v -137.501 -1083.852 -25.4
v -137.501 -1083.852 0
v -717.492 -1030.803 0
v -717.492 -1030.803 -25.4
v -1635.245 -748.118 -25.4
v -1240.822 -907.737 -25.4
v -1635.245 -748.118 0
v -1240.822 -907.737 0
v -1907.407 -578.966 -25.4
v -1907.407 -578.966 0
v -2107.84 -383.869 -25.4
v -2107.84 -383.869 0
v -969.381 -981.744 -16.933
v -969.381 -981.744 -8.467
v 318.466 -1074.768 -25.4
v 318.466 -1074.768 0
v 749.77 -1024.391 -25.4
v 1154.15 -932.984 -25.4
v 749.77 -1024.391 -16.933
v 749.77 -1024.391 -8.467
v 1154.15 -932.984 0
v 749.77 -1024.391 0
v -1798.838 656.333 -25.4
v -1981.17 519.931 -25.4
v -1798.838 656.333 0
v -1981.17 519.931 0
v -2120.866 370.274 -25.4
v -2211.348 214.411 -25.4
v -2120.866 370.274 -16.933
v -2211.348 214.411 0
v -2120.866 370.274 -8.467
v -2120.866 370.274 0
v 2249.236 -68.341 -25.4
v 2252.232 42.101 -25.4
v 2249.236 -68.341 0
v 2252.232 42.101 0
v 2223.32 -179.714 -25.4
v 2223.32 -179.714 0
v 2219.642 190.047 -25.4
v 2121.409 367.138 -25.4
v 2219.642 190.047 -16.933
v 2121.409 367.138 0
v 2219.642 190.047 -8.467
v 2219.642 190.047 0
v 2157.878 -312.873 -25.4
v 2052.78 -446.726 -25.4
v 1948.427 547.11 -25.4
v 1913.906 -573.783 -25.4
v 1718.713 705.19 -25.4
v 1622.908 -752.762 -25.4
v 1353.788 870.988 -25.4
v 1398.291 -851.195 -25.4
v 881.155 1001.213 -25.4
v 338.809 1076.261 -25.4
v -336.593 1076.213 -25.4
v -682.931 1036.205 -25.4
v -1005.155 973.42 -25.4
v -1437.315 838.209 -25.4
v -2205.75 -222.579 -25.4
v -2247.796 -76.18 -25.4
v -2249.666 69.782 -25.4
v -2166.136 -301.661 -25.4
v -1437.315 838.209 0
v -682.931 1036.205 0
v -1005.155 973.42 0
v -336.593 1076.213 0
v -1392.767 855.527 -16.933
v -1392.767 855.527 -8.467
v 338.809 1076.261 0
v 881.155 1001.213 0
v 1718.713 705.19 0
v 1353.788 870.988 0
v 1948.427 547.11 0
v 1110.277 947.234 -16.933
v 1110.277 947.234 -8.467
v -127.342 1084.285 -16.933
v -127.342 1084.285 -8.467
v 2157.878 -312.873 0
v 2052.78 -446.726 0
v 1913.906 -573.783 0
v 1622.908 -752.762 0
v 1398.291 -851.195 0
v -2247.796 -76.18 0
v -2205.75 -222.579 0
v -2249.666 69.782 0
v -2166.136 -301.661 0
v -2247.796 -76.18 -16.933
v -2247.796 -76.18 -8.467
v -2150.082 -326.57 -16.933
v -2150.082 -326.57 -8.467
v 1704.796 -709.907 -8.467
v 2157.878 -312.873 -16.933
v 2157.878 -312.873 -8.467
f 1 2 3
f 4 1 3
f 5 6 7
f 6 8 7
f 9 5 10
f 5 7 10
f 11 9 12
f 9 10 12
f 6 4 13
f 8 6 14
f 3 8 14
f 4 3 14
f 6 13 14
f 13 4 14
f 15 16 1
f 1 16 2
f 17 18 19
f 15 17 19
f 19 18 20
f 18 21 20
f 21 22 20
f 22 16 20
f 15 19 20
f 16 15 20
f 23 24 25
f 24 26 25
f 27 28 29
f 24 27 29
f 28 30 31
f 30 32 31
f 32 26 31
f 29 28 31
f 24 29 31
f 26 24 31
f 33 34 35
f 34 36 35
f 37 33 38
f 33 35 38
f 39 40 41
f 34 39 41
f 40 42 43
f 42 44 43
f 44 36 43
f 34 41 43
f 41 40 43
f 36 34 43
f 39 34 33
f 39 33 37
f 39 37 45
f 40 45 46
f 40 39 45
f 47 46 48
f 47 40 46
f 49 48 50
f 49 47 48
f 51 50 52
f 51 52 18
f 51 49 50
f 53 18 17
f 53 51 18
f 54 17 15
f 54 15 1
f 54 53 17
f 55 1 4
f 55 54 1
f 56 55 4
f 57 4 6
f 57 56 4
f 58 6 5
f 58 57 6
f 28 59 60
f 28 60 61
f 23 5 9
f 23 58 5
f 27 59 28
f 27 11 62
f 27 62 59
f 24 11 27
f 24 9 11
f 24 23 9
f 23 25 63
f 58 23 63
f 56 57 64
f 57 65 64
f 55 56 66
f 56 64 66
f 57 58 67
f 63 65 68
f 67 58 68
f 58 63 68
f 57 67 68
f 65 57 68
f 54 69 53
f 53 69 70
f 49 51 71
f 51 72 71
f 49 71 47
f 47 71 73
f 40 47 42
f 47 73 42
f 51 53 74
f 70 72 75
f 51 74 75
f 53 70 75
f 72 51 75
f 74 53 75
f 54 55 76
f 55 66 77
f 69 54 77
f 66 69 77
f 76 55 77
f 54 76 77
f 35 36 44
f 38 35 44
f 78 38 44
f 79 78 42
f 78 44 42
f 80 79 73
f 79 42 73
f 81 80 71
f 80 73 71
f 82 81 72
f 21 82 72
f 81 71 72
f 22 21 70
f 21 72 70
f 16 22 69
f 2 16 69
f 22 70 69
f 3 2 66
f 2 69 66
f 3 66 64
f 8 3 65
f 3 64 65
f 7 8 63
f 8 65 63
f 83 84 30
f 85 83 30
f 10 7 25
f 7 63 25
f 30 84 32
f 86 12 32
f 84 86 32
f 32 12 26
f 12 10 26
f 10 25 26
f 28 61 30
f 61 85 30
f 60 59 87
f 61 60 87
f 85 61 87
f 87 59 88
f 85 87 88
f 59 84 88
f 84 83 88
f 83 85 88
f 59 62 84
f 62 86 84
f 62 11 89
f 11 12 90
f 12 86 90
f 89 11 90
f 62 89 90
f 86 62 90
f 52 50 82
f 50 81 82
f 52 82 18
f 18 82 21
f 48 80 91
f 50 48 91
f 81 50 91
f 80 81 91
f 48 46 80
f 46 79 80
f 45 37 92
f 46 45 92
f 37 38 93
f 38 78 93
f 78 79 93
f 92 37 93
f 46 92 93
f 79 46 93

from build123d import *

# Parameters (mm, degrees)
F2_DEPTH = 25.4


with BuildPart() as f2:
    # F1 (on Top) → F2 (new body)
    with BuildSketch(Plane.XY):
        with BuildLine():
            add(Edge.make_bspline(
                [(338.808568, 1076.2607888), (1177.613977, 1009.3793122), (1835.703466, 747.5897164), (2121.40927, 367.1379246)],
                knots=[0, 0, 0, 0, 1, 1, 1, 1], degree=3))
            add(Edge.make_bspline(
                [(-336.59318, 1076.2131638), (-184.038113, 1088.3100662), (187.362211, 1088.3362028), (338.808568, 1076.2607888)],
                knots=[0, 0, 0, 0, 1, 1, 1, 1], degree=3))
            add(Edge.make_bspline(
                [(-1798.8381092, 656.3331552), (-1440.1367184, 883.221119), (-932.630342, 1028.9502916), (-336.59318, 1076.2131638)],
                knots=[0, 0, 0, 0, 1, 1, 1, 1], degree=3))
            add(Edge.make_bspline(
                [(-2211.3484602, 214.4111282), (-2147.6651738, 371.0291792), (-2000.2956692, 528.9060796), (-1798.8381092, 656.3331552)],
                knots=[0, 0, 0, 0, 1, 1, 1, 1], degree=3))
            add(Edge.make_bspline(
                [(-2205.74997, -222.5787014), (-2267.88091, -76.2598424), (-2269.7642692, 70.7474074), (-2211.3484602, 214.4111282)],
                knots=[0, 0, 0, 0, 1, 1, 1, 1], degree=3))
            add(Edge.make_bspline(
                [(-2107.8400058, -383.8687014), (-2158.7942346, -318.362584), (-2179.703921, -283.9173392), (-2205.74997, -222.5787014)],
                knots=[0, 0, 0, 0, 1, 1, 1, 1], degree=3))
            add(Edge.make_bspline(
                [(-137.500868, -1083.8523154), (-1015.799975, -1061.966126), (-1795.9728114, -784.8016054), (-2107.8400058, -383.8687014)],
                knots=[0, 0, 0, 0, 1, 1, 1, 1], degree=3))
            add(Edge.make_bspline(
                [(1154.149711, -932.9843164), (763.987042, -1044.816935), (330.0419612, -1095.5029144), (-137.500868, -1083.8523154)],
                knots=[0, 0, 0, 0, 1, 1, 1, 1], degree=3))
            add(Edge.make_bspline(
                [(1913.9062052, -573.7834346), (1736.4828618, -713.5553674), (1454.3809368, -846.9286084), (1154.149711, -932.9843164)],
                knots=[0, 0, 0, 0, 1, 1, 1, 1], degree=3))
            add(Edge.make_bspline(
                [(2223.319912, -179.7139154), (2179.667218, -310.0282852), (2067.7067612, -452.6212436), (1913.9062052, -573.7834346)],
                knots=[0, 0, 0, 0, 1, 1, 1, 1], degree=3))
            add(Edge.make_bspline(
                [(2121.40927, 367.1379246), (2251.550107, 193.8400746), (2286.1893062, 7.9665576), (2223.319912, -179.7139154)],
                knots=[0, 0, 0, 0, 1, 1, 1, 1], degree=3))
        make_face()
    extrude(amount=-F2_DEPTH)


solid = f2.part
